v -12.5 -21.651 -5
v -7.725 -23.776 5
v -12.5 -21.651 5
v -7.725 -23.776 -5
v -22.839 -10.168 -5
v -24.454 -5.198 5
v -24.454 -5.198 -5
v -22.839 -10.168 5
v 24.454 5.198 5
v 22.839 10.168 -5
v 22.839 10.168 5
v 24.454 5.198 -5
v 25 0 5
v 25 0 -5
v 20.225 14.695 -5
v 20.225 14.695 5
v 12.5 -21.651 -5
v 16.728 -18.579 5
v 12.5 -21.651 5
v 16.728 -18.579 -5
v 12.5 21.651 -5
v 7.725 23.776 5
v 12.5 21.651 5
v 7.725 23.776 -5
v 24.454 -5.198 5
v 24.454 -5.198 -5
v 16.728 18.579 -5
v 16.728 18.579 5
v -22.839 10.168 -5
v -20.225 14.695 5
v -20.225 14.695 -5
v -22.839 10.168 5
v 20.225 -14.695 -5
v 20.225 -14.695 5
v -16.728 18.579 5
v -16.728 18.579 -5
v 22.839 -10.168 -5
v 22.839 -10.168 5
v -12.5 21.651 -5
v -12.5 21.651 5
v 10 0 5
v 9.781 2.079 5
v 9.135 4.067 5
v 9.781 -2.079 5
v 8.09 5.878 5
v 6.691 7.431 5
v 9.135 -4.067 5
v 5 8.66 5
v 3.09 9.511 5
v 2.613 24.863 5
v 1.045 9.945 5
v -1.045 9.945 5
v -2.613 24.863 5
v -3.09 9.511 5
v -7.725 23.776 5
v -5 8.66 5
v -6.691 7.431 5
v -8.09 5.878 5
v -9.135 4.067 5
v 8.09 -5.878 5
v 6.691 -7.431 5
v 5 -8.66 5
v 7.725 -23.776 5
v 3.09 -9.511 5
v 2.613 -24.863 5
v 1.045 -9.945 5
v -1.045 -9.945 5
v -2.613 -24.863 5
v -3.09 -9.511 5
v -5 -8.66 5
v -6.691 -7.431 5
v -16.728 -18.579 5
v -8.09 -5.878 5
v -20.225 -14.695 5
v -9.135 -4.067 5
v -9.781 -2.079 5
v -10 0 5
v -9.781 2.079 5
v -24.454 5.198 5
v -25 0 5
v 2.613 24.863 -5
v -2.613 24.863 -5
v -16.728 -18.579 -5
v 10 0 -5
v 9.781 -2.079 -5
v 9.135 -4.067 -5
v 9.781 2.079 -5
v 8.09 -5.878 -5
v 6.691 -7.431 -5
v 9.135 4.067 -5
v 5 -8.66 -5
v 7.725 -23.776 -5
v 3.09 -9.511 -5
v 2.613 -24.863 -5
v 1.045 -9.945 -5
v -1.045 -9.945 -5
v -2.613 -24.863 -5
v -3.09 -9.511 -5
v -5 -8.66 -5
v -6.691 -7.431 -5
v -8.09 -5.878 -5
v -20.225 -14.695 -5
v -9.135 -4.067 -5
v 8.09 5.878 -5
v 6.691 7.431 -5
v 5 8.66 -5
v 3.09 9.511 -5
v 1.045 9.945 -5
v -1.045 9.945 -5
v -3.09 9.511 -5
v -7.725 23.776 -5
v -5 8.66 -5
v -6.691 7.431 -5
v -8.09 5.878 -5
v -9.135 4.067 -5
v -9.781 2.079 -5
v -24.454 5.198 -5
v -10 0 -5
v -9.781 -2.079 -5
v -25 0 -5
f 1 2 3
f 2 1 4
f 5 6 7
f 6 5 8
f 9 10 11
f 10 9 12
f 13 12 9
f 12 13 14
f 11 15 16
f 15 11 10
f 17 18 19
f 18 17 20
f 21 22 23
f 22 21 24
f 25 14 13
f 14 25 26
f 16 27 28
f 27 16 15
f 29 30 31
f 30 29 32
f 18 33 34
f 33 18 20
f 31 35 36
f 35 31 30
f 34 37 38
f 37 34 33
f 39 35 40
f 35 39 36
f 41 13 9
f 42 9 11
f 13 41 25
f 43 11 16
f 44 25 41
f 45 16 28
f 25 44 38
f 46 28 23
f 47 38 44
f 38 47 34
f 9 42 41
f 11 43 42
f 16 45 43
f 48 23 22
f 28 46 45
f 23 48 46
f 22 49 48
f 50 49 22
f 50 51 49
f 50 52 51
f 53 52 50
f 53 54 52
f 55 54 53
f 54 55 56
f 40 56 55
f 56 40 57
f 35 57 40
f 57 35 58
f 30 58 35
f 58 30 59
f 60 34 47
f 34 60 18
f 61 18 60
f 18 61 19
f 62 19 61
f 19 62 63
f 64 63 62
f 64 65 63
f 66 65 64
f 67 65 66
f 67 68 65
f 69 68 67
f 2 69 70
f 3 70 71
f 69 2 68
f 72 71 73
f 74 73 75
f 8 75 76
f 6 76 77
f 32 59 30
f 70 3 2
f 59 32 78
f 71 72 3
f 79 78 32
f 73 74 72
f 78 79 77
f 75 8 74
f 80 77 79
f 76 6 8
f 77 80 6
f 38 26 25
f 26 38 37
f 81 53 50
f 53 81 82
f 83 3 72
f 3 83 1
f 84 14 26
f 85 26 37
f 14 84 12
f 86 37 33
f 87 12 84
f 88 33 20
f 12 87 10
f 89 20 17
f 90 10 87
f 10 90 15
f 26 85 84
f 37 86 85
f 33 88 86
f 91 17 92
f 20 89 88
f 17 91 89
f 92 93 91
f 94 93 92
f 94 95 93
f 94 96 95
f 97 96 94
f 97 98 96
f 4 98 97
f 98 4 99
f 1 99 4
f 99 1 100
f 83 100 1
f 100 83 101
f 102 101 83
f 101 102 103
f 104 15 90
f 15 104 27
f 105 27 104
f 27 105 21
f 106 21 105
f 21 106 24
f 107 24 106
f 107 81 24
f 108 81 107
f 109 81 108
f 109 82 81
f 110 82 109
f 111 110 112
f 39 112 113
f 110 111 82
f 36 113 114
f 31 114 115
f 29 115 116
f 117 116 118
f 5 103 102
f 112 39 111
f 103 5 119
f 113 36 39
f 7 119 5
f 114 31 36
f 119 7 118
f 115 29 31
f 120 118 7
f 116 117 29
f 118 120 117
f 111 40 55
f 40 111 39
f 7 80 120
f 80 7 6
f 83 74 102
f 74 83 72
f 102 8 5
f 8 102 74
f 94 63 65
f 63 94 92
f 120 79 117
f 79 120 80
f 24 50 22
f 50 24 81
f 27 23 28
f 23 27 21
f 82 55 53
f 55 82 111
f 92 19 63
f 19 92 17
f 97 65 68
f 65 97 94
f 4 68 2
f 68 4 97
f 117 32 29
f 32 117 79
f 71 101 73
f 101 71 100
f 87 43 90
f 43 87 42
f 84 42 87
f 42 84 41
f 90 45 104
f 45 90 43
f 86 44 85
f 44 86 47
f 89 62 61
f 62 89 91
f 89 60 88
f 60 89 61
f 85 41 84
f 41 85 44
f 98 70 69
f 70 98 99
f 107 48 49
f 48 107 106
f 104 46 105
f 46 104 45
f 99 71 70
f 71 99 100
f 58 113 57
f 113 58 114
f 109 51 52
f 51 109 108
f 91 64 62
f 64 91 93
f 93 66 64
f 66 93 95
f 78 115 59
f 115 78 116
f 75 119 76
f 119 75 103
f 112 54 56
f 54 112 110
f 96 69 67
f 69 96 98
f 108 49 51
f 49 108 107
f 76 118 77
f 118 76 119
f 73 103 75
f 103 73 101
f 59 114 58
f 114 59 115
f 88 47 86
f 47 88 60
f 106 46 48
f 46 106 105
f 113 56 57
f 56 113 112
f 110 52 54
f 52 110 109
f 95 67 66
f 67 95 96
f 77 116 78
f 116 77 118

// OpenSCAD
// Parameters
outer_diameter = 50;
thickness = 10;
inner_diameter = 20;

// Main radial body
module radial_main_body() {
    difference() {
        cylinder(h = thickness, d = outer_diameter, center = true);
        center_bore();
    }
}

// Center bore
module center_bore() {
    cylinder(h = thickness + 2, d = inner_diameter, center = true);
}

// Render the model
radial_main_body();
